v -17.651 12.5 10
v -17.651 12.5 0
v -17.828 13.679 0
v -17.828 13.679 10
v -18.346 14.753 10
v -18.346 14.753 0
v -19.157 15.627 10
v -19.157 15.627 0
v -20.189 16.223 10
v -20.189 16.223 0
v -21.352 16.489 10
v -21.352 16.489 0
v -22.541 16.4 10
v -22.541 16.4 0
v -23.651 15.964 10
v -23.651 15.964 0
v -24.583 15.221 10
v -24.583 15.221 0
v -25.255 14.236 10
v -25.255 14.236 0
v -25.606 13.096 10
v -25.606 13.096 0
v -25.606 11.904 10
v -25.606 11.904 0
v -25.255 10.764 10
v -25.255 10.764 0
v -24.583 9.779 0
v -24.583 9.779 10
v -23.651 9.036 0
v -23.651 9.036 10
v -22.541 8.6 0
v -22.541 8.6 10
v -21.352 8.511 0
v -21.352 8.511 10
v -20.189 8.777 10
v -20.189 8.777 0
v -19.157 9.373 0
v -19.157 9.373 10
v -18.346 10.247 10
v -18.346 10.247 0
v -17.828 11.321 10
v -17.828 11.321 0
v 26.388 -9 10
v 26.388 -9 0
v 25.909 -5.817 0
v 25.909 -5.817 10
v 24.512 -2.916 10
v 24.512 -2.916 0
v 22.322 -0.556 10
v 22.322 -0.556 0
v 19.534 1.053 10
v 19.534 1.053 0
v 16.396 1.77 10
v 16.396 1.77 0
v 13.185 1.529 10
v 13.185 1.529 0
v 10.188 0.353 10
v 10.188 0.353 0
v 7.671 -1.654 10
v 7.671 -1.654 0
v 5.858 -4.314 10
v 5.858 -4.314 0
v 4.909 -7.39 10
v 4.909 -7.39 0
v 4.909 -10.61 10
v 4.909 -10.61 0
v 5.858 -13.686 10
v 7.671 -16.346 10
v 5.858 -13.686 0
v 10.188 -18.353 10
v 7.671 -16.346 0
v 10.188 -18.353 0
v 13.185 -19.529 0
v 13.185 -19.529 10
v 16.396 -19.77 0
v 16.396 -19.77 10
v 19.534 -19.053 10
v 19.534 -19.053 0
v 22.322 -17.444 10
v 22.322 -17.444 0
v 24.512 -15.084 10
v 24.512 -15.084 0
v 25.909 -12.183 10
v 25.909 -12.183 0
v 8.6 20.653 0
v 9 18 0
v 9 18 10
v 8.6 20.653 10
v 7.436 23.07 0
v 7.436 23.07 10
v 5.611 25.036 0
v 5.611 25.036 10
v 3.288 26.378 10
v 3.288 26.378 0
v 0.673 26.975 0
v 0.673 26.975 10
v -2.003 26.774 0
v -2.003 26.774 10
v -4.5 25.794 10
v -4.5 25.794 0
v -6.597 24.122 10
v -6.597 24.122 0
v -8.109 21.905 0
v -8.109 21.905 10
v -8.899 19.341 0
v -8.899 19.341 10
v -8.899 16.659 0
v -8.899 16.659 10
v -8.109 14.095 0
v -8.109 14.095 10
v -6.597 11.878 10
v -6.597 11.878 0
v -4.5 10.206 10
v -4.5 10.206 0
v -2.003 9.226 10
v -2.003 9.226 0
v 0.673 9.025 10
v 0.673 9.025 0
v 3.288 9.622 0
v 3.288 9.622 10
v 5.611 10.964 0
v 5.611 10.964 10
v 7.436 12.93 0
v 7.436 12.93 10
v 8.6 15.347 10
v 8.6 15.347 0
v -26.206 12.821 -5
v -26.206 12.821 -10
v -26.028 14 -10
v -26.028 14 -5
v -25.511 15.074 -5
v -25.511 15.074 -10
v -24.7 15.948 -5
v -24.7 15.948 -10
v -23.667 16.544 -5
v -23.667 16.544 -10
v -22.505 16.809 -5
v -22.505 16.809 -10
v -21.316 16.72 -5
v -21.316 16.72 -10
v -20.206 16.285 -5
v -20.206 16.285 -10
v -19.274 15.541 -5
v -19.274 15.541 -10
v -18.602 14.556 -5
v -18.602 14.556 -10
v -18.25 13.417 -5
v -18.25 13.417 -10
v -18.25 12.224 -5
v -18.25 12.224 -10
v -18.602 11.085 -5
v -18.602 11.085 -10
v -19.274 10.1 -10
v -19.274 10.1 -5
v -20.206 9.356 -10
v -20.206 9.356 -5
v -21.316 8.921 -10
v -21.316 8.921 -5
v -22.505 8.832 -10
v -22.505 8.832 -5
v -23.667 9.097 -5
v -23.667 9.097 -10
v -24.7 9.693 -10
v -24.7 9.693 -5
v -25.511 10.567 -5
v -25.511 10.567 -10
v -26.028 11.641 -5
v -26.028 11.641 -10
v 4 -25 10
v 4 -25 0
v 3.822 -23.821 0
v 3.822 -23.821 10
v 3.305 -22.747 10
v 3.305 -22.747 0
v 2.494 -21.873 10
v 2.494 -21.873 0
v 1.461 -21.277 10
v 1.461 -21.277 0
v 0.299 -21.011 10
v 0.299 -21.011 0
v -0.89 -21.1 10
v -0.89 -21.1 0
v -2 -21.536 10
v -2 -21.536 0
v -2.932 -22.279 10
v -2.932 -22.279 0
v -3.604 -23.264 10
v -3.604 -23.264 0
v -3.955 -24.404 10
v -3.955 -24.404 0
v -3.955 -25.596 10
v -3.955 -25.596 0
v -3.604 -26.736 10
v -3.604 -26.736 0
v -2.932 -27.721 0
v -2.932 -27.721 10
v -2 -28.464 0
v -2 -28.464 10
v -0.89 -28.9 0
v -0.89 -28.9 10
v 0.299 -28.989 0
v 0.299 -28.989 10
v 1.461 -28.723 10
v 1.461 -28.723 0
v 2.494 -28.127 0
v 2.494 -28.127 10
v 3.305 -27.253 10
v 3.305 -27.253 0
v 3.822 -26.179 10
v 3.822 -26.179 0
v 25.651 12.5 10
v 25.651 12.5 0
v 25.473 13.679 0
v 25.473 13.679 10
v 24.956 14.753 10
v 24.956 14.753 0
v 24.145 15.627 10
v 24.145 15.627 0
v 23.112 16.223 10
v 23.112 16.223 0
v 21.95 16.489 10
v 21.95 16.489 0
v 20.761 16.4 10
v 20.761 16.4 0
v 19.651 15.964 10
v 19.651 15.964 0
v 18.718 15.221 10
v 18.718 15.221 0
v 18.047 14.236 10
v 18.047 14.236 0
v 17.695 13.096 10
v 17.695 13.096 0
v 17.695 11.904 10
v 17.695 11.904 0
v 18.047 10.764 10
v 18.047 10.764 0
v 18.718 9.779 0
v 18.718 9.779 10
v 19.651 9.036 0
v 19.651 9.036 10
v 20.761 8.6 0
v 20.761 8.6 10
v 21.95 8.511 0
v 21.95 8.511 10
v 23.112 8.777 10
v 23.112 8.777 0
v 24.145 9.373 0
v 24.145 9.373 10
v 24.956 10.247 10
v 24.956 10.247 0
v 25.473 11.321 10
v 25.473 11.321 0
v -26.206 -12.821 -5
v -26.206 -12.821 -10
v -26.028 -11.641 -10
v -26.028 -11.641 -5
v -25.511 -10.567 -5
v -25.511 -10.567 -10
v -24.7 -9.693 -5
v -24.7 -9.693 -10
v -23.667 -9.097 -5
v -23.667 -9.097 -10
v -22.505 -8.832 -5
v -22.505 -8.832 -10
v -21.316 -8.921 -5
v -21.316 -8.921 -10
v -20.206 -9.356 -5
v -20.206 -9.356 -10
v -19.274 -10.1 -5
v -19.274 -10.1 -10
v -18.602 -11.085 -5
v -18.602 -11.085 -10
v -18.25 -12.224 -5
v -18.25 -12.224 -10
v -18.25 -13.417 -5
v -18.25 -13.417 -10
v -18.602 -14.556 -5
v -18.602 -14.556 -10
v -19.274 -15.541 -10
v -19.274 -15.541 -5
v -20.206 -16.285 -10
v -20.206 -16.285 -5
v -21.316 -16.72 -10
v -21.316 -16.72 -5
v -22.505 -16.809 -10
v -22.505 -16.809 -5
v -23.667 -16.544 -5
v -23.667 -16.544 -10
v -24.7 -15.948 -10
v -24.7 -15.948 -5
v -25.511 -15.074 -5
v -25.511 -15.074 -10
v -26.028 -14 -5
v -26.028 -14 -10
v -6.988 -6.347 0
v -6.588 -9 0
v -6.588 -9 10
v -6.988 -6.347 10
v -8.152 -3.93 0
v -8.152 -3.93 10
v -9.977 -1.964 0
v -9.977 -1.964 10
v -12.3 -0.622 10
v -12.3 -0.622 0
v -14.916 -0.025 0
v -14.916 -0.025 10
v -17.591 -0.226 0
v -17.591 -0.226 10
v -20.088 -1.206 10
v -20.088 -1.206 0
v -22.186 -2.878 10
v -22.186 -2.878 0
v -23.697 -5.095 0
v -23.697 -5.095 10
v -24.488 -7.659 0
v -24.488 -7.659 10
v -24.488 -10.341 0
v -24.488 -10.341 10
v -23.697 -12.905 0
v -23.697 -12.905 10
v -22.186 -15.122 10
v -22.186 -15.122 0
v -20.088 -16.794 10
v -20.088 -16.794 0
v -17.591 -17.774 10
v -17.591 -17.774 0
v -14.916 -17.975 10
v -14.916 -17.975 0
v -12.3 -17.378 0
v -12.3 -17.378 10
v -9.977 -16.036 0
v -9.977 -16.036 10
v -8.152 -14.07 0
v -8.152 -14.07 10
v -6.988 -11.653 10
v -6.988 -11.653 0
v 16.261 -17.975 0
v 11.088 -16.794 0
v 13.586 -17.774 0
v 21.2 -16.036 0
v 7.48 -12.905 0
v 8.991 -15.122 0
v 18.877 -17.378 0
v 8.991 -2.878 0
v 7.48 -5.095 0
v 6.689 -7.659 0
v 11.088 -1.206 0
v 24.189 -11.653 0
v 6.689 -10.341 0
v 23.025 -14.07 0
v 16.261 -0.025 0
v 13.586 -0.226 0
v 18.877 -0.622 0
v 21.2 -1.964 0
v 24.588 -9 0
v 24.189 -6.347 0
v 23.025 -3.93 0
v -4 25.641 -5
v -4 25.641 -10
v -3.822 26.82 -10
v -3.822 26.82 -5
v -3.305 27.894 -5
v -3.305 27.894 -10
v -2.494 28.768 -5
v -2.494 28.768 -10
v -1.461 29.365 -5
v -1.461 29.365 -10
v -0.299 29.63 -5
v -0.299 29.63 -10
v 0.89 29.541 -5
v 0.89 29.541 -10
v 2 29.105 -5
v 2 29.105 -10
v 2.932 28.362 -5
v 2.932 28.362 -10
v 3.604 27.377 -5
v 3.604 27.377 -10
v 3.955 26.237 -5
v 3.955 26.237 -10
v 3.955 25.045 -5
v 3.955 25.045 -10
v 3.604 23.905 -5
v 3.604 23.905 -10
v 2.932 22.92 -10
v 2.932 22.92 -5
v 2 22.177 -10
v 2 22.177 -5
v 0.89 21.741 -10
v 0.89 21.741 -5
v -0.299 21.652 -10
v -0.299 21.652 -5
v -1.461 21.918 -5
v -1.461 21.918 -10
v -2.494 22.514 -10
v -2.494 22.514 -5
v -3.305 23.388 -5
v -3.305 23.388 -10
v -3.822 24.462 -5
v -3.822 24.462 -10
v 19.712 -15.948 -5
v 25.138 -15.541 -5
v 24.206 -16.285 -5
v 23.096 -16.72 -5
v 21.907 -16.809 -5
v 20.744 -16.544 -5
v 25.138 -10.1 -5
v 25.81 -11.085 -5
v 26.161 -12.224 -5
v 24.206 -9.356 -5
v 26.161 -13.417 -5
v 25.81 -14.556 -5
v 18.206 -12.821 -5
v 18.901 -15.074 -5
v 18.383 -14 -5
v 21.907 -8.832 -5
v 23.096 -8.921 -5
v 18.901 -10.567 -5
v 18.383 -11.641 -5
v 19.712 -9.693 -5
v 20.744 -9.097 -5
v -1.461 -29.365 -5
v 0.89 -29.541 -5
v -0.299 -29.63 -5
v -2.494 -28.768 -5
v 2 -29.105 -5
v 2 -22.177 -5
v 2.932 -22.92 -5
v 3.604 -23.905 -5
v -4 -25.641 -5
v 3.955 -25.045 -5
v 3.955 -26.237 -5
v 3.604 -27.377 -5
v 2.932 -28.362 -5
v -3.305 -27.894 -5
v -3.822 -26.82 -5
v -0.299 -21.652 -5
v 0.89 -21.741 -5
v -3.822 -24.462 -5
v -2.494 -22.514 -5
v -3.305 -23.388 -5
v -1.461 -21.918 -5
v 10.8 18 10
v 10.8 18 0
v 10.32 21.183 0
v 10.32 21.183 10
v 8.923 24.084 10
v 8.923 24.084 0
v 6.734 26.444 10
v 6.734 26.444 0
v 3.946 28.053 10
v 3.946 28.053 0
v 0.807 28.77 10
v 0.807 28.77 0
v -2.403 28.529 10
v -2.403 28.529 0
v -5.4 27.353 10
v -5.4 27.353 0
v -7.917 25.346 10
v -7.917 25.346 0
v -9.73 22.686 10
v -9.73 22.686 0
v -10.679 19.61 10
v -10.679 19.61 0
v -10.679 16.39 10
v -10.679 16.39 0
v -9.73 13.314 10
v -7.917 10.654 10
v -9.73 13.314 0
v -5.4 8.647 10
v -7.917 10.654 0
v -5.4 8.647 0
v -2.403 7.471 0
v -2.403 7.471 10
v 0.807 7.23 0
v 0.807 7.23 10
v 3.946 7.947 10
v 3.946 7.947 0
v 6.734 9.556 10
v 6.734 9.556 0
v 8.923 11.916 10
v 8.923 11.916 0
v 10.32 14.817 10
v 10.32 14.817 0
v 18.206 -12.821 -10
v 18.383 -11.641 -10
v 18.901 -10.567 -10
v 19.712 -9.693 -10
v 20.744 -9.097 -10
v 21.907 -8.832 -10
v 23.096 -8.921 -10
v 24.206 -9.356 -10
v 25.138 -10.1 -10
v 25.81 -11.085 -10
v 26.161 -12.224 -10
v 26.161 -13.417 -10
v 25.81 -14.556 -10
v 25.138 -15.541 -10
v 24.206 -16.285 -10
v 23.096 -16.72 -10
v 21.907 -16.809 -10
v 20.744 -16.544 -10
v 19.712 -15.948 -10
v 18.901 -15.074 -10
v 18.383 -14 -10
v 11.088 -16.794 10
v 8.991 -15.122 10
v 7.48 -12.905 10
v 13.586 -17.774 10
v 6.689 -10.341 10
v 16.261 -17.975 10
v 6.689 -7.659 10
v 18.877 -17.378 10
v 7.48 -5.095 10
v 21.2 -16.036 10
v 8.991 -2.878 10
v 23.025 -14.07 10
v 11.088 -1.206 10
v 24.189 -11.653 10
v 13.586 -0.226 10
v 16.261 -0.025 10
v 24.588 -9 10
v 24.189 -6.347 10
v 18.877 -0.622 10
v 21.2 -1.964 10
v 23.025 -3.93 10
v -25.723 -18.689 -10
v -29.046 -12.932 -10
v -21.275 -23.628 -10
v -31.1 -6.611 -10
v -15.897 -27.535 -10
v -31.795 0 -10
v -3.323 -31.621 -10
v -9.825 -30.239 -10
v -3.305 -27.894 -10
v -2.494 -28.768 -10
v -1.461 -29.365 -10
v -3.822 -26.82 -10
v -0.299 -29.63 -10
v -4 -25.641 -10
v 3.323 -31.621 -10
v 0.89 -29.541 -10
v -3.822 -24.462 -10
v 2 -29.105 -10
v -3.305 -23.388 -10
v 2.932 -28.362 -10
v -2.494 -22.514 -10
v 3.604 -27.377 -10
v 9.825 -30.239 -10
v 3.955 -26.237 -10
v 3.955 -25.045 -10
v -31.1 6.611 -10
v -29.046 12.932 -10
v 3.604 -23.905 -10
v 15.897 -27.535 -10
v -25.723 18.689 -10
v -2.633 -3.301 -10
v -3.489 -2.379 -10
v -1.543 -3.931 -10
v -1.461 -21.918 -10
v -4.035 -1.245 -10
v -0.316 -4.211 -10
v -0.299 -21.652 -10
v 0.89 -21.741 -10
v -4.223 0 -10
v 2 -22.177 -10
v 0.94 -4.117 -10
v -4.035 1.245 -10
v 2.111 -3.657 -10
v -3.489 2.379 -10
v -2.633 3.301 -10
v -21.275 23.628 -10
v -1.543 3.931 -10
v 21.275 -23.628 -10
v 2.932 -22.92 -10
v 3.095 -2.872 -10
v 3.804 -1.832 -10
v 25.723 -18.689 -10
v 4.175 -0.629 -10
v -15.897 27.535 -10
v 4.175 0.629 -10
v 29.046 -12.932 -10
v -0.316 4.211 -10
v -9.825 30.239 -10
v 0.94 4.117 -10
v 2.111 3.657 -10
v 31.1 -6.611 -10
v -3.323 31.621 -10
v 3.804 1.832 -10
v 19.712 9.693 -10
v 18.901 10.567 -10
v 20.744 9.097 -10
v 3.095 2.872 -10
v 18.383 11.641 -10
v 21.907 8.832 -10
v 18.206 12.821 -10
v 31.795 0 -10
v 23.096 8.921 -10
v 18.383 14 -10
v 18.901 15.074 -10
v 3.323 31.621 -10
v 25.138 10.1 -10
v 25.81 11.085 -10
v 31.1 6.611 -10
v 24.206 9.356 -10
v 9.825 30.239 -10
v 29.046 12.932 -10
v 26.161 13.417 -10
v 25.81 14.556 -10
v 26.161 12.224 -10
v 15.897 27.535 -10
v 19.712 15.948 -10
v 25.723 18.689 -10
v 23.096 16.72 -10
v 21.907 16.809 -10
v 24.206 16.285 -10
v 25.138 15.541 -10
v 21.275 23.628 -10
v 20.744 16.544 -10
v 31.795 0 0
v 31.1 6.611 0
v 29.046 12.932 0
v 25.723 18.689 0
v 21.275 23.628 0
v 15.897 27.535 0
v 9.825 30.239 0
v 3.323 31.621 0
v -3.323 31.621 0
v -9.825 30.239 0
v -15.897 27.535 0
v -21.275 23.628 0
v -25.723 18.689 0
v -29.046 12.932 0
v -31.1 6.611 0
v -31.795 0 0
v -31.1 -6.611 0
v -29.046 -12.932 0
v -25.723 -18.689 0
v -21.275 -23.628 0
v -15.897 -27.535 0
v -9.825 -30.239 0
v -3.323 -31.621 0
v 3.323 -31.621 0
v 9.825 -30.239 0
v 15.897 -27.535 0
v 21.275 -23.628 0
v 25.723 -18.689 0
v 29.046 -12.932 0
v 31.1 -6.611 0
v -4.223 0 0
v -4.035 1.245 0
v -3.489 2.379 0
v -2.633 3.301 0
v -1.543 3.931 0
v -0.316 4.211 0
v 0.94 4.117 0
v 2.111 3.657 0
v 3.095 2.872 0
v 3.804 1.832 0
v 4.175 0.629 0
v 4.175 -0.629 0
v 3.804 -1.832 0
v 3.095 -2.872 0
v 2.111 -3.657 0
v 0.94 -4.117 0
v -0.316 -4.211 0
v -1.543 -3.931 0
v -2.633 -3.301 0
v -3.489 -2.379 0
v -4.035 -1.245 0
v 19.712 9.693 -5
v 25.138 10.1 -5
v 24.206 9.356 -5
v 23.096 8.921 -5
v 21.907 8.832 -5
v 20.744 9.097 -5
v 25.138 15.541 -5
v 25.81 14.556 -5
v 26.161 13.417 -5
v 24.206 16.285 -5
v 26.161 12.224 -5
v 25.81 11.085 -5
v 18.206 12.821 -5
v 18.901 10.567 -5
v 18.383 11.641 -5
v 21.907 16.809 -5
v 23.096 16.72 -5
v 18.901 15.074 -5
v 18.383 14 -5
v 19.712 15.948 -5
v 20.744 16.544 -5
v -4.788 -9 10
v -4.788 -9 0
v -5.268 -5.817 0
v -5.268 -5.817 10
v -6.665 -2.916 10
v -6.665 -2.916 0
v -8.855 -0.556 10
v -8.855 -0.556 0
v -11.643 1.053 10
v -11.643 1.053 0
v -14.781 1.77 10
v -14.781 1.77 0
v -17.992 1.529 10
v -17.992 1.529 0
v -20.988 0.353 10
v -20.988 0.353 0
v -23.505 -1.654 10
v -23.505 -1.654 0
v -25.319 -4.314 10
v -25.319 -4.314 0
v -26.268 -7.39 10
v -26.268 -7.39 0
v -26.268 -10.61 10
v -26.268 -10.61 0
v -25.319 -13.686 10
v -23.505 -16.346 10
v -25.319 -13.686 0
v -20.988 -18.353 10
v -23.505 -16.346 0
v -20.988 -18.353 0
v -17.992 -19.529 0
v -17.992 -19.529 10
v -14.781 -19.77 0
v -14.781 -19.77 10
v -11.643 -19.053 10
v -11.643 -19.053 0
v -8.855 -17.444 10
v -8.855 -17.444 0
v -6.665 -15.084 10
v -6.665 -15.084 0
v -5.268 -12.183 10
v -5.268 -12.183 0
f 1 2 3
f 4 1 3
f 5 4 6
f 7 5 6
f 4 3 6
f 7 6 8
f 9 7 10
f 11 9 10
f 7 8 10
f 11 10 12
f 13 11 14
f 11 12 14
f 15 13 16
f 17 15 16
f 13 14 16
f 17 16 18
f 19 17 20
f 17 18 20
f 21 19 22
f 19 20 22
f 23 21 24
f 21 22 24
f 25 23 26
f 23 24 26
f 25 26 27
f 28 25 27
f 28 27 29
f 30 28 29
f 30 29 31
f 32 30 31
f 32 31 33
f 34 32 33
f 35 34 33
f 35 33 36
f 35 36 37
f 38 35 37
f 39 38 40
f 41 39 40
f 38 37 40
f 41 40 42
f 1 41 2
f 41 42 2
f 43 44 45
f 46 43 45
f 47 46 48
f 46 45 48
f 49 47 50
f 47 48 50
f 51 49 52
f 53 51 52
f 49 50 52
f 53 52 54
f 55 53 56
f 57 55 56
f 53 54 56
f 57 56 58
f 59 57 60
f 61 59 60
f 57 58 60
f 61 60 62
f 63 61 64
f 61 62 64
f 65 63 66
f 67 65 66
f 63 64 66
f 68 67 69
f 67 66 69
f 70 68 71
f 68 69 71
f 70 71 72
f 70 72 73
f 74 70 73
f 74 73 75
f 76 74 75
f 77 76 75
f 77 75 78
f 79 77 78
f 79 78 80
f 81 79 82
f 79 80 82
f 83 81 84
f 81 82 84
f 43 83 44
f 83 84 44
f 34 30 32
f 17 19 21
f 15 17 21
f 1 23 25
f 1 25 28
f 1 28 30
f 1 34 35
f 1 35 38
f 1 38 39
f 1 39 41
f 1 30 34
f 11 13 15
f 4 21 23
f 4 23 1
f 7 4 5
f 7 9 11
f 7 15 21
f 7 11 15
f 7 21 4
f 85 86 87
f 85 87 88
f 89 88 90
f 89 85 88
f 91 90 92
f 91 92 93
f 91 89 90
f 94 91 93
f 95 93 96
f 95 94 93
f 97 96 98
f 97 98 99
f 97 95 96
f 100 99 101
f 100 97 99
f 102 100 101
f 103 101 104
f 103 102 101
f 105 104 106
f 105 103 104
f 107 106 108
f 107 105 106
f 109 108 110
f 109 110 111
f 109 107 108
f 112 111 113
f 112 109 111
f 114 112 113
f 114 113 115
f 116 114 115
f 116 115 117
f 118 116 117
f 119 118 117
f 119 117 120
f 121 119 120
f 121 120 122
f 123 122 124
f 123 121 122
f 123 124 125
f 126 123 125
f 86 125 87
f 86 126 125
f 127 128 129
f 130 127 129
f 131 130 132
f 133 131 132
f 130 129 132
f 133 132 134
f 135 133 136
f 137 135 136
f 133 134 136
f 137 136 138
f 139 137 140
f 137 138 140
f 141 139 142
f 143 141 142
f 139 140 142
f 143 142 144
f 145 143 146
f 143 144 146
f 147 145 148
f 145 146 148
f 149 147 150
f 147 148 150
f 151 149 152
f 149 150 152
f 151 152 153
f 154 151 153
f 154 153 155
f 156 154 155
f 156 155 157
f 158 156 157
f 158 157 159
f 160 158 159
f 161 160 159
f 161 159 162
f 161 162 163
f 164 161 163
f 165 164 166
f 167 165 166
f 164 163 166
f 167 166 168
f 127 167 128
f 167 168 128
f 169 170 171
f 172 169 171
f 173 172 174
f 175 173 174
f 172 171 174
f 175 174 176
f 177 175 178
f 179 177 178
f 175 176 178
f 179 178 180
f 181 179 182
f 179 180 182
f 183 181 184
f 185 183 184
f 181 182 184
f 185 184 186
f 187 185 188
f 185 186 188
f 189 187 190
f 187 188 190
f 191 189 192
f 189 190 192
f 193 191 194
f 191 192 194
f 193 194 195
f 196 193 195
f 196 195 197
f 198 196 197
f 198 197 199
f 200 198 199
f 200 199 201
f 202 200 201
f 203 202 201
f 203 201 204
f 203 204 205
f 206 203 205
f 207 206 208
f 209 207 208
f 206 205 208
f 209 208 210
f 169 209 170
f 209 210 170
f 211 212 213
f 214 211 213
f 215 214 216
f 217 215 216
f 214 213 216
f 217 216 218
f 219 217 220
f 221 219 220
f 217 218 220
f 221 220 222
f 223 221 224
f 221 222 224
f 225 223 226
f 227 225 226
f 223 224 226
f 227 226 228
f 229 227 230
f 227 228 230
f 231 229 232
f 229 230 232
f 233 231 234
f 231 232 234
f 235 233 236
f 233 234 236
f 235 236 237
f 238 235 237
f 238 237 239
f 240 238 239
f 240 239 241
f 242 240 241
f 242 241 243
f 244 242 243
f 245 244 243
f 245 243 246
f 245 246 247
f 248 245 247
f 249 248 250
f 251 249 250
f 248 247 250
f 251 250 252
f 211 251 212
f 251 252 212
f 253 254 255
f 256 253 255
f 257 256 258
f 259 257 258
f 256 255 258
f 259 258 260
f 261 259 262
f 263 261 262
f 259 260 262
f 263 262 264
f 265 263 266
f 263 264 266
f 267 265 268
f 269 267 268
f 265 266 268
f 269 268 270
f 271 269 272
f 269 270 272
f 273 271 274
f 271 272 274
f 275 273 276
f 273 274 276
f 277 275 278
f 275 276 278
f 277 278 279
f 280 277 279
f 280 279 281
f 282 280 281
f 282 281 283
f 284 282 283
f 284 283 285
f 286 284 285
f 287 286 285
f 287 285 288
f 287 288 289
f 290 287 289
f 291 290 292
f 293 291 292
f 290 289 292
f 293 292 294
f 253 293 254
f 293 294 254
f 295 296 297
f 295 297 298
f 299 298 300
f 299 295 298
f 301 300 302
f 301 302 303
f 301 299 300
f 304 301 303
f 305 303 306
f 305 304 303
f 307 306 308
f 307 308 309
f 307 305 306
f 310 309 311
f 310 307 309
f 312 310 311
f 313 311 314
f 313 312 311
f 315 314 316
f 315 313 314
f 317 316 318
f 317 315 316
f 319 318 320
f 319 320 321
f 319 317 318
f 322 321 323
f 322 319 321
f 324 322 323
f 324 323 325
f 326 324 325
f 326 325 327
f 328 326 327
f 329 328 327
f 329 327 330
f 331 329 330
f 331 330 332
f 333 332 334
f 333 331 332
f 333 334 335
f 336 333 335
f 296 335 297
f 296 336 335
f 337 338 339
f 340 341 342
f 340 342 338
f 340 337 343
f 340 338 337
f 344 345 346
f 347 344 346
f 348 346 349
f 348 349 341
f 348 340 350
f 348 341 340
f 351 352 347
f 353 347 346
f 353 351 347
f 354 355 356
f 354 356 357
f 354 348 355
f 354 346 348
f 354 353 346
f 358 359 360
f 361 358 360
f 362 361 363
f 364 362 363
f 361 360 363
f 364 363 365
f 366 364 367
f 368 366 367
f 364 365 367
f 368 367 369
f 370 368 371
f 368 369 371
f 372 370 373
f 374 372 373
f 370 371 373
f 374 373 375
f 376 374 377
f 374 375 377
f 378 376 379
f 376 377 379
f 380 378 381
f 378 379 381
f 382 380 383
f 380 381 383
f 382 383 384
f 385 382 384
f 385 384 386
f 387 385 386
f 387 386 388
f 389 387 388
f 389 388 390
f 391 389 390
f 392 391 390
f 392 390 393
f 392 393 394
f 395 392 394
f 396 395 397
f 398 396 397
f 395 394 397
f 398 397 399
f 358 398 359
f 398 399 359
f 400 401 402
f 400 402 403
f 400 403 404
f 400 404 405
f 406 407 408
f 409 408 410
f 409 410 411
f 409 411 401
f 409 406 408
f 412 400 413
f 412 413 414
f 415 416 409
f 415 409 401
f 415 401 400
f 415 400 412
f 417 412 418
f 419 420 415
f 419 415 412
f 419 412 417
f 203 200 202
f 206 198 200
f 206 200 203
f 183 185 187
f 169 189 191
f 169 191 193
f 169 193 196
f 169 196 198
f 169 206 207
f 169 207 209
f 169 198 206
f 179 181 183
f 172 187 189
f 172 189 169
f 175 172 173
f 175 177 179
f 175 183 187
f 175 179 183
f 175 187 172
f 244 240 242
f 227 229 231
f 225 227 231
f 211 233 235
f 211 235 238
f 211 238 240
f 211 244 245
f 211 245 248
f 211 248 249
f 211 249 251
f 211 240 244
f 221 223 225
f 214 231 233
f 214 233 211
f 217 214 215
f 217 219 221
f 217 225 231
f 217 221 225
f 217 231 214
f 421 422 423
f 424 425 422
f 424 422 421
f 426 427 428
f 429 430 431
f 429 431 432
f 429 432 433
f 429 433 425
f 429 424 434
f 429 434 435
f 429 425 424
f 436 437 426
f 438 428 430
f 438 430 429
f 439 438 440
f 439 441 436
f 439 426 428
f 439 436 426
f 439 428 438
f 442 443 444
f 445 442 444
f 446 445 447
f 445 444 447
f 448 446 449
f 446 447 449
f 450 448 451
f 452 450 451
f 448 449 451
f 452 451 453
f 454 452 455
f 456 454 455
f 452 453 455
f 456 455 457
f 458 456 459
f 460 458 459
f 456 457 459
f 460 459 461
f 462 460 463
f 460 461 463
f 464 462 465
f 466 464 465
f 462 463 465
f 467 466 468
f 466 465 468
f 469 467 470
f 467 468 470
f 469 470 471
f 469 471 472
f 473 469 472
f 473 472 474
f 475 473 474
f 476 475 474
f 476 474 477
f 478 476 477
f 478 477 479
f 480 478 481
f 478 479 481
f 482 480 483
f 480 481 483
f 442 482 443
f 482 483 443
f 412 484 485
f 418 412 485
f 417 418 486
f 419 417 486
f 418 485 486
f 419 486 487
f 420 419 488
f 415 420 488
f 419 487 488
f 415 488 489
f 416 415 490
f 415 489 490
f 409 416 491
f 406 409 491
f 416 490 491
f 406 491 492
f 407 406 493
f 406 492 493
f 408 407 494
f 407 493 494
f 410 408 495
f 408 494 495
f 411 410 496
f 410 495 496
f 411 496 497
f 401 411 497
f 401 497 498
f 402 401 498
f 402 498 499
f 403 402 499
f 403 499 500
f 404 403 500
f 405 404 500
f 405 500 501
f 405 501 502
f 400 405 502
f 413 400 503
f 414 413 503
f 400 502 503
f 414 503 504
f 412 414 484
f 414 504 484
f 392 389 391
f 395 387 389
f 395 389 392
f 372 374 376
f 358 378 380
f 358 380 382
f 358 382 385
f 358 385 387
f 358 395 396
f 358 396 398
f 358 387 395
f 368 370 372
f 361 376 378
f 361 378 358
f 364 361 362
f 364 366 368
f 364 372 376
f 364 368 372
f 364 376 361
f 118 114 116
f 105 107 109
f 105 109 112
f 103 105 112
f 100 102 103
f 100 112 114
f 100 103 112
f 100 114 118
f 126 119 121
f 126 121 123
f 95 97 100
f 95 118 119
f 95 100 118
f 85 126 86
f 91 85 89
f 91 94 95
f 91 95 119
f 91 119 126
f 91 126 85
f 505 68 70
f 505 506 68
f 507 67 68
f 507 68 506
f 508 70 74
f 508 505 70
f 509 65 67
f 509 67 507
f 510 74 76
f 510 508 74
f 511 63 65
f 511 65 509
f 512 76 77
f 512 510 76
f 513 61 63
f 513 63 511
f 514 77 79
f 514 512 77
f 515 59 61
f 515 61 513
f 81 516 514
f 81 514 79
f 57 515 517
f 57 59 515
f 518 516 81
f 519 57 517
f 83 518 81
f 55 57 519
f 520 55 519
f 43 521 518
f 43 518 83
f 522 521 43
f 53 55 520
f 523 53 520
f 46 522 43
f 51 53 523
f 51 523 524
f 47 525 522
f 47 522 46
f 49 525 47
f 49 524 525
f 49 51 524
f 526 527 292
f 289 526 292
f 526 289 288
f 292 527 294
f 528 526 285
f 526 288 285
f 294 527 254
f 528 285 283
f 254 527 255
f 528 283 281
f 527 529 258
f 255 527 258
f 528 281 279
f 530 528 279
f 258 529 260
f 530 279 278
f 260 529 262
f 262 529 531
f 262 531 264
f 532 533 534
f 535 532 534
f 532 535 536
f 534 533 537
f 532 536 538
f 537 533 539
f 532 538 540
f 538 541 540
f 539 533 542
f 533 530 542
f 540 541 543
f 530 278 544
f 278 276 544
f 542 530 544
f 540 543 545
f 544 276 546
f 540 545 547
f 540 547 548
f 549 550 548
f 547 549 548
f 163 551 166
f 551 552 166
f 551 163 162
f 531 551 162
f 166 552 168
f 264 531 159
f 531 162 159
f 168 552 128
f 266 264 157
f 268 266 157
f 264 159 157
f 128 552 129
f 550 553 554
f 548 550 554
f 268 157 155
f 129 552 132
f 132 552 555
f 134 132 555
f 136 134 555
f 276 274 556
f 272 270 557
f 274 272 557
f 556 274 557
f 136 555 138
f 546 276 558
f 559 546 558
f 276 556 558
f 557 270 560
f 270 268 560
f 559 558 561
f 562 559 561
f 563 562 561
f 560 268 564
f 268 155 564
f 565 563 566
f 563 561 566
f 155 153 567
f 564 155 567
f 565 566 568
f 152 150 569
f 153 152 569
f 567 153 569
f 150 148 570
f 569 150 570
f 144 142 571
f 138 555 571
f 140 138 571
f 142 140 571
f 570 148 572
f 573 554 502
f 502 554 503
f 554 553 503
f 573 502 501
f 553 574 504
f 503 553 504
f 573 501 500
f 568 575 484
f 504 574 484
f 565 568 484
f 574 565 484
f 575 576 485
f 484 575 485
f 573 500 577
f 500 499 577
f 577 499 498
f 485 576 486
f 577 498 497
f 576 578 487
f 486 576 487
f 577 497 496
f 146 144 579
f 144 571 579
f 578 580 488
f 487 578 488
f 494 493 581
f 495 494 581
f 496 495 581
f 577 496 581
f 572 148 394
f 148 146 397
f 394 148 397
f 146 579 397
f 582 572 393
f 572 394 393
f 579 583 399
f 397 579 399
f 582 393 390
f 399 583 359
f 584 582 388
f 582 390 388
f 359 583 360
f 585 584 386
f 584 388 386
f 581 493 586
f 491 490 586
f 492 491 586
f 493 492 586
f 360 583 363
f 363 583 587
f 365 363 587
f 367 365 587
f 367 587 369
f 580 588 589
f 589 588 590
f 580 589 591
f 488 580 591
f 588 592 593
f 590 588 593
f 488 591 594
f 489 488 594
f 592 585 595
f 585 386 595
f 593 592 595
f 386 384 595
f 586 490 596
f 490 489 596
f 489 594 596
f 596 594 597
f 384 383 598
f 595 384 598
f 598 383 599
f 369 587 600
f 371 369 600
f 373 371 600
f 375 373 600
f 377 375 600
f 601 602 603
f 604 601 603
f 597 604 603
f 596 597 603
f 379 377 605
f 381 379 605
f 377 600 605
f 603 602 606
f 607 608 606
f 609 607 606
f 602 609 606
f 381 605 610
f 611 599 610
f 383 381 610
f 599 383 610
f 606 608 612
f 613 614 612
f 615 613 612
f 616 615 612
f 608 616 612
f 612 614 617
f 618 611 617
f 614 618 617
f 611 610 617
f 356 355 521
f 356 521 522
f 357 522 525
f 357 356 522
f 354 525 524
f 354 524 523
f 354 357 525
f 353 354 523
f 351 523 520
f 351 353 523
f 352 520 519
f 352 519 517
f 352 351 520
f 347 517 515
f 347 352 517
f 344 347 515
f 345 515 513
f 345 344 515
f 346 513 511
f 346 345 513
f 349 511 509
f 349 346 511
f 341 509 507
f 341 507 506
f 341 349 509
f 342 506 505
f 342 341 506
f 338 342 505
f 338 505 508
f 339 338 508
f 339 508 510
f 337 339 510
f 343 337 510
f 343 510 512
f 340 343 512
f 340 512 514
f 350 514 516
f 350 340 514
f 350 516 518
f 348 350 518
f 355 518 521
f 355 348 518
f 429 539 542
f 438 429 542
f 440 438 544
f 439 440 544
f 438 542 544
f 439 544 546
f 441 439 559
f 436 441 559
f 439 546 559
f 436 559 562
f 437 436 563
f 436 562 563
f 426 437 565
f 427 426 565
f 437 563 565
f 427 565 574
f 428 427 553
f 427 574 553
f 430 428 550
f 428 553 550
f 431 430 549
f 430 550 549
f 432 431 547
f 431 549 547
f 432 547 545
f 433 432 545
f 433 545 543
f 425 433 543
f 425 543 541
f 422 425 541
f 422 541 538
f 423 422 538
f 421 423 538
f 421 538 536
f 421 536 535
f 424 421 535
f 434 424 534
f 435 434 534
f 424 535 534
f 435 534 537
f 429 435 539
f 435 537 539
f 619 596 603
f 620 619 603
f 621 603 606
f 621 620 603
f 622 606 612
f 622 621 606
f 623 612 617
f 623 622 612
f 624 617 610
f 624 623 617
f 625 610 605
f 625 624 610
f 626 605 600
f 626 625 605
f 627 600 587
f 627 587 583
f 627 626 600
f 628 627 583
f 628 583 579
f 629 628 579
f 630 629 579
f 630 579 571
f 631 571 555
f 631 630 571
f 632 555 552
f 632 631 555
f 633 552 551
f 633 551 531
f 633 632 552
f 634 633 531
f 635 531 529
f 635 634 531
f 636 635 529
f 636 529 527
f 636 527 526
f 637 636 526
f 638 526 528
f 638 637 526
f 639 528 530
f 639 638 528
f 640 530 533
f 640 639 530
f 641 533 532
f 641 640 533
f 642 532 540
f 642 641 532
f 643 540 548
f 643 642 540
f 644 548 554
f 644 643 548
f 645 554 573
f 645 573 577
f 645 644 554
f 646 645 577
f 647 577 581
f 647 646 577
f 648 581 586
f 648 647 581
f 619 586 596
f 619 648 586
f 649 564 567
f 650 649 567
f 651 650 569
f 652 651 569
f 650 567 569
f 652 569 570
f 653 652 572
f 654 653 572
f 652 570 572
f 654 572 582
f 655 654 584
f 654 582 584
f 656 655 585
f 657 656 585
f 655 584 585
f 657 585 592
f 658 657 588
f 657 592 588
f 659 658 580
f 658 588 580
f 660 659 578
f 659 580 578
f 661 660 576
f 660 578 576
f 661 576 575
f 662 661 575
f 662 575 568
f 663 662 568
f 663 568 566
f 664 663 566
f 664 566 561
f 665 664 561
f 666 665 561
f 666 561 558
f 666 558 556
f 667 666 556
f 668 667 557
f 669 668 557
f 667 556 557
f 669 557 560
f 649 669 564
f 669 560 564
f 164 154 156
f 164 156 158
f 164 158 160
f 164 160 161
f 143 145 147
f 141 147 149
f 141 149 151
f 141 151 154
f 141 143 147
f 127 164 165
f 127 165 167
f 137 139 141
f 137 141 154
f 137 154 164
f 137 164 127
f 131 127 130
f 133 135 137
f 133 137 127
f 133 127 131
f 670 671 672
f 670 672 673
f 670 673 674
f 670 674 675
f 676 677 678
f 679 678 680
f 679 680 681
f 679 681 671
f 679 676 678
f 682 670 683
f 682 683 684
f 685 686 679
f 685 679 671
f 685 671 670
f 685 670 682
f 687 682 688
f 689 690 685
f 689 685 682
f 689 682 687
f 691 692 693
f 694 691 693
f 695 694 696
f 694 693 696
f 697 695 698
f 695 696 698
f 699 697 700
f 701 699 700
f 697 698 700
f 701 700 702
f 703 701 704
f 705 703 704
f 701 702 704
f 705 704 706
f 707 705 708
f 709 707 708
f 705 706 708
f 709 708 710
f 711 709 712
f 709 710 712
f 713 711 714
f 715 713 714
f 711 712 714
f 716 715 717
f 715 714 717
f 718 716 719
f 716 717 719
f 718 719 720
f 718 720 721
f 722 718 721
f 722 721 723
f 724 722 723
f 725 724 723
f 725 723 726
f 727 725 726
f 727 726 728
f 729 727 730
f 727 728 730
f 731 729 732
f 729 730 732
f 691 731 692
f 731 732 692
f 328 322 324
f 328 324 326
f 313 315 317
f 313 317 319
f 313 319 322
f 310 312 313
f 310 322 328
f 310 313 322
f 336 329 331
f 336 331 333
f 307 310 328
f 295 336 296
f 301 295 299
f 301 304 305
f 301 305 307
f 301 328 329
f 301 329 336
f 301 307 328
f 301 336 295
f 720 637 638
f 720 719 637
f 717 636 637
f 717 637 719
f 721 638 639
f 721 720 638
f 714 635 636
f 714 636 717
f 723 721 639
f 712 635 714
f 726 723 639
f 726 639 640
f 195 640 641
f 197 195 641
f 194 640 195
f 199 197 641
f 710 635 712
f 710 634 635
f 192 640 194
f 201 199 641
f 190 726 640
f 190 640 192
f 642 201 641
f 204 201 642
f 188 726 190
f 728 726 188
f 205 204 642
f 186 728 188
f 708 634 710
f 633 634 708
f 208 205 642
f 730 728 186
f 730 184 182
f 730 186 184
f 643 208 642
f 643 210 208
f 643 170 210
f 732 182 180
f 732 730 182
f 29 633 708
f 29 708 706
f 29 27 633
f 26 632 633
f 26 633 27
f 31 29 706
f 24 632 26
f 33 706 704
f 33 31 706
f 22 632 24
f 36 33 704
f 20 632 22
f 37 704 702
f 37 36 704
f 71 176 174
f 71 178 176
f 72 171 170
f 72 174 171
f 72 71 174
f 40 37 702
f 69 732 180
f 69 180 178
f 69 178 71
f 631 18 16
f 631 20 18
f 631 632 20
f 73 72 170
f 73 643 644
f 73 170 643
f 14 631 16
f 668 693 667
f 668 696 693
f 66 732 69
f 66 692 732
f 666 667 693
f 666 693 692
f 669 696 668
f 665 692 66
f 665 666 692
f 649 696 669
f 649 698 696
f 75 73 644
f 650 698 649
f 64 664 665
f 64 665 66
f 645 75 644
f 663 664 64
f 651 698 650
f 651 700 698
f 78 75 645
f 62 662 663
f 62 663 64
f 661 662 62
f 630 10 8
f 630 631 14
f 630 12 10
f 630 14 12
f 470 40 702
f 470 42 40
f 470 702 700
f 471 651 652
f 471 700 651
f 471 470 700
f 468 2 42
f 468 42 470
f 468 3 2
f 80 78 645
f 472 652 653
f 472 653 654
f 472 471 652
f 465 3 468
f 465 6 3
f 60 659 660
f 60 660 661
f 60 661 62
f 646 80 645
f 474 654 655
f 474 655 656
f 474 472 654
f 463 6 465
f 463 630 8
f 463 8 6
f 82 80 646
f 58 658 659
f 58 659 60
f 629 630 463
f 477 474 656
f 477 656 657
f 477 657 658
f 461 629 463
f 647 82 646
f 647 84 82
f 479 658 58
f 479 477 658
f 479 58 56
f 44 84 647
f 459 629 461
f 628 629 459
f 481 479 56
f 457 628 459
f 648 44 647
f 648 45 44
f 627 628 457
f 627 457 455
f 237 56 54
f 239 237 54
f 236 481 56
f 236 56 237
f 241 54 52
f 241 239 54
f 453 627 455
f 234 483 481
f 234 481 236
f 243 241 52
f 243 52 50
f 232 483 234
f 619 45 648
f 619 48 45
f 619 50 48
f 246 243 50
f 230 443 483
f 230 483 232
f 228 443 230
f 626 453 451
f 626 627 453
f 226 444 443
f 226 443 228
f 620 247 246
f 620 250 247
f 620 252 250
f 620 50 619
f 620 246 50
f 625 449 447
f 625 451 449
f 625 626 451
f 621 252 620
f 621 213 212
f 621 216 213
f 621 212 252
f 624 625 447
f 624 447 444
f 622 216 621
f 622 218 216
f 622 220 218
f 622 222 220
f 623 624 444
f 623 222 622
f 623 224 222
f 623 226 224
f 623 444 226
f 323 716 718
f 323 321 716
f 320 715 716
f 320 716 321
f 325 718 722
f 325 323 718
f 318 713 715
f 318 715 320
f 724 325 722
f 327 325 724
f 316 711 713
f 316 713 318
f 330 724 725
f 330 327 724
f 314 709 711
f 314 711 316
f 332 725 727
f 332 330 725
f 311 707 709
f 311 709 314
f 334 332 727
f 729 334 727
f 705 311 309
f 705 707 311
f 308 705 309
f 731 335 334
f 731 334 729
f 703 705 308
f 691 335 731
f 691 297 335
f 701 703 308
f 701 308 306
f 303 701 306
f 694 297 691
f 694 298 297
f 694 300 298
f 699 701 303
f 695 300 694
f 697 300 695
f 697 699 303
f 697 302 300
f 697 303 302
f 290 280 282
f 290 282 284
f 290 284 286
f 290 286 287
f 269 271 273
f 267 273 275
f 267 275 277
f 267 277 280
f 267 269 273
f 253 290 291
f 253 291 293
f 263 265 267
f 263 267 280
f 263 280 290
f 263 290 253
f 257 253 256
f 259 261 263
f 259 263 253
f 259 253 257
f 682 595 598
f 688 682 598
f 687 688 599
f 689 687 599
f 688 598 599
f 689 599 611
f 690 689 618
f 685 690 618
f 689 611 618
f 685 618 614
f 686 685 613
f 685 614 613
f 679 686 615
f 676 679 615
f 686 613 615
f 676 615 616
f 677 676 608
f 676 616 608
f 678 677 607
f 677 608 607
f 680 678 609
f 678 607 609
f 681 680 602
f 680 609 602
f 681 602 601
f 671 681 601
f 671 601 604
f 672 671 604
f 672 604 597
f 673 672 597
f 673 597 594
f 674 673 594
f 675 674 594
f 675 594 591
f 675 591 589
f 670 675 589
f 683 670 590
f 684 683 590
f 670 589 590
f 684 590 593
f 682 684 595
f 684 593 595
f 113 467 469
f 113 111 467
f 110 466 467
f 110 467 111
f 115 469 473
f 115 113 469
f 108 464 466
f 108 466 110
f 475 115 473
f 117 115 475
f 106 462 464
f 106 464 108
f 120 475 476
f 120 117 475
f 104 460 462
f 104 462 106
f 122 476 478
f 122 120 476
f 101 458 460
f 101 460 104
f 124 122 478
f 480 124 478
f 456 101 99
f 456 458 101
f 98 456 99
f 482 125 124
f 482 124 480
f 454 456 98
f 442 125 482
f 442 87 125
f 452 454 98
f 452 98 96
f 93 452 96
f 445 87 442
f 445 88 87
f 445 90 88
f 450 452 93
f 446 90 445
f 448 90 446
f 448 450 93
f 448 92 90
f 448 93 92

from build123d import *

# Parameters (mm, degrees)
ESQUISSE4_R             = 31.794871795
BOSS_EXTRU_1_DEPTH      = 10
ESQUISSE5_R             = 10.8
ESQUISSE5_R_2           = 9
ESQUISSE5_R_3           = 4
BOSS_EXTRU_2_DEPTH      = 10
ESQUISSE6_R             = 4
ENL_V_MAT_EXTRU_2_DEPTH = 5
ESQUISSE8_R             = 4.222540961
ENL_V_MAT_EXTRU_4_DEPTH = 10


with BuildPart() as part:
    # Esquisse4 → Boss.-Extru.1 (new body)
    with BuildSketch(Plane.XY):
        Circle(ESQUISSE4_R)
    extrude(amount=-BOSS_EXTRU_1_DEPTH)

    # Esquisse5 → Boss.-Extru.2 (add)
    # profile 1 of 6: a face of its own
    with BuildSketch(Plane.XY):
        with Locations((15.588457268, -9)):
            Circle(ESQUISSE5_R)
        with Locations((15.588457268, -9)):
            Circle(ESQUISSE5_R_2, mode=Mode.SUBTRACT)
    # profile 2 of 6: a face of its own
    with BuildSketch(Plane.XY):
        with Locations((-15.588457268, -9)):
            Circle(ESQUISSE5_R)
        with Locations((-15.588457268, -9)):
            Circle(ESQUISSE5_R_2, mode=Mode.SUBTRACT)
    # profile 3 of 6: a face of its own
    with BuildSketch(Plane.XY):
        with Locations((0, 18)):
            Circle(ESQUISSE5_R)
        with Locations((0, 18)):
            Circle(ESQUISSE5_R_2, mode=Mode.SUBTRACT)
    # profile 4 of 6: a face of its own
    with BuildSketch(Plane.XY):
        with Locations((21.650635095, 12.5)):
            Circle(ESQUISSE5_R_3)
    # profile 5 of 6: a face of its own
    with BuildSketch(Plane.XY):
        with Locations((-21.650635095, 12.5)):
            Circle(ESQUISSE5_R_3)
    # profile 6 of 6: a face of its own
    with BuildSketch(Plane.XY):
        with Locations((0, -25)):
            Circle(ESQUISSE5_R_3)
    extrude(amount=BOSS_EXTRU_2_DEPTH)

    # Esquisse6 → Enlèv. mat.-Extru.2 (cut)
    with BuildSketch(Plane(origin=(0, 0, -10), x_dir=(-1, 0, 0), z_dir=(0, 0, -1))):
        with Locations((0, 25.641025641)):
            Circle(ESQUISSE6_R)
        with Locations((22.205779584, 12.820512821)):
            Circle(ESQUISSE6_R)
        with Locations((22.205779584, -12.820512821)):
            Circle(ESQUISSE6_R)
        with Locations((0, -25.641025641)):
            Circle(ESQUISSE6_R)
        with Locations((-22.205779584, -12.820512821)):
            Circle(ESQUISSE6_R)
        with Locations((-22.205779584, 12.820512821)):
            Circle(ESQUISSE6_R)
    extrude(amount=-ENL_V_MAT_EXTRU_2_DEPTH, mode=Mode.SUBTRACT)

    # Esquisse8 → Enlèv. mat.-Extru.4 (cut)
    with BuildSketch(Plane(origin=(0, 0, -10), x_dir=(-1, 0, 0), z_dir=(0, 0, -1))):
        Circle(ESQUISSE8_R)
    extrude(amount=-ENL_V_MAT_EXTRU_4_DEPTH, mode=Mode.SUBTRACT)


solid = part.part
